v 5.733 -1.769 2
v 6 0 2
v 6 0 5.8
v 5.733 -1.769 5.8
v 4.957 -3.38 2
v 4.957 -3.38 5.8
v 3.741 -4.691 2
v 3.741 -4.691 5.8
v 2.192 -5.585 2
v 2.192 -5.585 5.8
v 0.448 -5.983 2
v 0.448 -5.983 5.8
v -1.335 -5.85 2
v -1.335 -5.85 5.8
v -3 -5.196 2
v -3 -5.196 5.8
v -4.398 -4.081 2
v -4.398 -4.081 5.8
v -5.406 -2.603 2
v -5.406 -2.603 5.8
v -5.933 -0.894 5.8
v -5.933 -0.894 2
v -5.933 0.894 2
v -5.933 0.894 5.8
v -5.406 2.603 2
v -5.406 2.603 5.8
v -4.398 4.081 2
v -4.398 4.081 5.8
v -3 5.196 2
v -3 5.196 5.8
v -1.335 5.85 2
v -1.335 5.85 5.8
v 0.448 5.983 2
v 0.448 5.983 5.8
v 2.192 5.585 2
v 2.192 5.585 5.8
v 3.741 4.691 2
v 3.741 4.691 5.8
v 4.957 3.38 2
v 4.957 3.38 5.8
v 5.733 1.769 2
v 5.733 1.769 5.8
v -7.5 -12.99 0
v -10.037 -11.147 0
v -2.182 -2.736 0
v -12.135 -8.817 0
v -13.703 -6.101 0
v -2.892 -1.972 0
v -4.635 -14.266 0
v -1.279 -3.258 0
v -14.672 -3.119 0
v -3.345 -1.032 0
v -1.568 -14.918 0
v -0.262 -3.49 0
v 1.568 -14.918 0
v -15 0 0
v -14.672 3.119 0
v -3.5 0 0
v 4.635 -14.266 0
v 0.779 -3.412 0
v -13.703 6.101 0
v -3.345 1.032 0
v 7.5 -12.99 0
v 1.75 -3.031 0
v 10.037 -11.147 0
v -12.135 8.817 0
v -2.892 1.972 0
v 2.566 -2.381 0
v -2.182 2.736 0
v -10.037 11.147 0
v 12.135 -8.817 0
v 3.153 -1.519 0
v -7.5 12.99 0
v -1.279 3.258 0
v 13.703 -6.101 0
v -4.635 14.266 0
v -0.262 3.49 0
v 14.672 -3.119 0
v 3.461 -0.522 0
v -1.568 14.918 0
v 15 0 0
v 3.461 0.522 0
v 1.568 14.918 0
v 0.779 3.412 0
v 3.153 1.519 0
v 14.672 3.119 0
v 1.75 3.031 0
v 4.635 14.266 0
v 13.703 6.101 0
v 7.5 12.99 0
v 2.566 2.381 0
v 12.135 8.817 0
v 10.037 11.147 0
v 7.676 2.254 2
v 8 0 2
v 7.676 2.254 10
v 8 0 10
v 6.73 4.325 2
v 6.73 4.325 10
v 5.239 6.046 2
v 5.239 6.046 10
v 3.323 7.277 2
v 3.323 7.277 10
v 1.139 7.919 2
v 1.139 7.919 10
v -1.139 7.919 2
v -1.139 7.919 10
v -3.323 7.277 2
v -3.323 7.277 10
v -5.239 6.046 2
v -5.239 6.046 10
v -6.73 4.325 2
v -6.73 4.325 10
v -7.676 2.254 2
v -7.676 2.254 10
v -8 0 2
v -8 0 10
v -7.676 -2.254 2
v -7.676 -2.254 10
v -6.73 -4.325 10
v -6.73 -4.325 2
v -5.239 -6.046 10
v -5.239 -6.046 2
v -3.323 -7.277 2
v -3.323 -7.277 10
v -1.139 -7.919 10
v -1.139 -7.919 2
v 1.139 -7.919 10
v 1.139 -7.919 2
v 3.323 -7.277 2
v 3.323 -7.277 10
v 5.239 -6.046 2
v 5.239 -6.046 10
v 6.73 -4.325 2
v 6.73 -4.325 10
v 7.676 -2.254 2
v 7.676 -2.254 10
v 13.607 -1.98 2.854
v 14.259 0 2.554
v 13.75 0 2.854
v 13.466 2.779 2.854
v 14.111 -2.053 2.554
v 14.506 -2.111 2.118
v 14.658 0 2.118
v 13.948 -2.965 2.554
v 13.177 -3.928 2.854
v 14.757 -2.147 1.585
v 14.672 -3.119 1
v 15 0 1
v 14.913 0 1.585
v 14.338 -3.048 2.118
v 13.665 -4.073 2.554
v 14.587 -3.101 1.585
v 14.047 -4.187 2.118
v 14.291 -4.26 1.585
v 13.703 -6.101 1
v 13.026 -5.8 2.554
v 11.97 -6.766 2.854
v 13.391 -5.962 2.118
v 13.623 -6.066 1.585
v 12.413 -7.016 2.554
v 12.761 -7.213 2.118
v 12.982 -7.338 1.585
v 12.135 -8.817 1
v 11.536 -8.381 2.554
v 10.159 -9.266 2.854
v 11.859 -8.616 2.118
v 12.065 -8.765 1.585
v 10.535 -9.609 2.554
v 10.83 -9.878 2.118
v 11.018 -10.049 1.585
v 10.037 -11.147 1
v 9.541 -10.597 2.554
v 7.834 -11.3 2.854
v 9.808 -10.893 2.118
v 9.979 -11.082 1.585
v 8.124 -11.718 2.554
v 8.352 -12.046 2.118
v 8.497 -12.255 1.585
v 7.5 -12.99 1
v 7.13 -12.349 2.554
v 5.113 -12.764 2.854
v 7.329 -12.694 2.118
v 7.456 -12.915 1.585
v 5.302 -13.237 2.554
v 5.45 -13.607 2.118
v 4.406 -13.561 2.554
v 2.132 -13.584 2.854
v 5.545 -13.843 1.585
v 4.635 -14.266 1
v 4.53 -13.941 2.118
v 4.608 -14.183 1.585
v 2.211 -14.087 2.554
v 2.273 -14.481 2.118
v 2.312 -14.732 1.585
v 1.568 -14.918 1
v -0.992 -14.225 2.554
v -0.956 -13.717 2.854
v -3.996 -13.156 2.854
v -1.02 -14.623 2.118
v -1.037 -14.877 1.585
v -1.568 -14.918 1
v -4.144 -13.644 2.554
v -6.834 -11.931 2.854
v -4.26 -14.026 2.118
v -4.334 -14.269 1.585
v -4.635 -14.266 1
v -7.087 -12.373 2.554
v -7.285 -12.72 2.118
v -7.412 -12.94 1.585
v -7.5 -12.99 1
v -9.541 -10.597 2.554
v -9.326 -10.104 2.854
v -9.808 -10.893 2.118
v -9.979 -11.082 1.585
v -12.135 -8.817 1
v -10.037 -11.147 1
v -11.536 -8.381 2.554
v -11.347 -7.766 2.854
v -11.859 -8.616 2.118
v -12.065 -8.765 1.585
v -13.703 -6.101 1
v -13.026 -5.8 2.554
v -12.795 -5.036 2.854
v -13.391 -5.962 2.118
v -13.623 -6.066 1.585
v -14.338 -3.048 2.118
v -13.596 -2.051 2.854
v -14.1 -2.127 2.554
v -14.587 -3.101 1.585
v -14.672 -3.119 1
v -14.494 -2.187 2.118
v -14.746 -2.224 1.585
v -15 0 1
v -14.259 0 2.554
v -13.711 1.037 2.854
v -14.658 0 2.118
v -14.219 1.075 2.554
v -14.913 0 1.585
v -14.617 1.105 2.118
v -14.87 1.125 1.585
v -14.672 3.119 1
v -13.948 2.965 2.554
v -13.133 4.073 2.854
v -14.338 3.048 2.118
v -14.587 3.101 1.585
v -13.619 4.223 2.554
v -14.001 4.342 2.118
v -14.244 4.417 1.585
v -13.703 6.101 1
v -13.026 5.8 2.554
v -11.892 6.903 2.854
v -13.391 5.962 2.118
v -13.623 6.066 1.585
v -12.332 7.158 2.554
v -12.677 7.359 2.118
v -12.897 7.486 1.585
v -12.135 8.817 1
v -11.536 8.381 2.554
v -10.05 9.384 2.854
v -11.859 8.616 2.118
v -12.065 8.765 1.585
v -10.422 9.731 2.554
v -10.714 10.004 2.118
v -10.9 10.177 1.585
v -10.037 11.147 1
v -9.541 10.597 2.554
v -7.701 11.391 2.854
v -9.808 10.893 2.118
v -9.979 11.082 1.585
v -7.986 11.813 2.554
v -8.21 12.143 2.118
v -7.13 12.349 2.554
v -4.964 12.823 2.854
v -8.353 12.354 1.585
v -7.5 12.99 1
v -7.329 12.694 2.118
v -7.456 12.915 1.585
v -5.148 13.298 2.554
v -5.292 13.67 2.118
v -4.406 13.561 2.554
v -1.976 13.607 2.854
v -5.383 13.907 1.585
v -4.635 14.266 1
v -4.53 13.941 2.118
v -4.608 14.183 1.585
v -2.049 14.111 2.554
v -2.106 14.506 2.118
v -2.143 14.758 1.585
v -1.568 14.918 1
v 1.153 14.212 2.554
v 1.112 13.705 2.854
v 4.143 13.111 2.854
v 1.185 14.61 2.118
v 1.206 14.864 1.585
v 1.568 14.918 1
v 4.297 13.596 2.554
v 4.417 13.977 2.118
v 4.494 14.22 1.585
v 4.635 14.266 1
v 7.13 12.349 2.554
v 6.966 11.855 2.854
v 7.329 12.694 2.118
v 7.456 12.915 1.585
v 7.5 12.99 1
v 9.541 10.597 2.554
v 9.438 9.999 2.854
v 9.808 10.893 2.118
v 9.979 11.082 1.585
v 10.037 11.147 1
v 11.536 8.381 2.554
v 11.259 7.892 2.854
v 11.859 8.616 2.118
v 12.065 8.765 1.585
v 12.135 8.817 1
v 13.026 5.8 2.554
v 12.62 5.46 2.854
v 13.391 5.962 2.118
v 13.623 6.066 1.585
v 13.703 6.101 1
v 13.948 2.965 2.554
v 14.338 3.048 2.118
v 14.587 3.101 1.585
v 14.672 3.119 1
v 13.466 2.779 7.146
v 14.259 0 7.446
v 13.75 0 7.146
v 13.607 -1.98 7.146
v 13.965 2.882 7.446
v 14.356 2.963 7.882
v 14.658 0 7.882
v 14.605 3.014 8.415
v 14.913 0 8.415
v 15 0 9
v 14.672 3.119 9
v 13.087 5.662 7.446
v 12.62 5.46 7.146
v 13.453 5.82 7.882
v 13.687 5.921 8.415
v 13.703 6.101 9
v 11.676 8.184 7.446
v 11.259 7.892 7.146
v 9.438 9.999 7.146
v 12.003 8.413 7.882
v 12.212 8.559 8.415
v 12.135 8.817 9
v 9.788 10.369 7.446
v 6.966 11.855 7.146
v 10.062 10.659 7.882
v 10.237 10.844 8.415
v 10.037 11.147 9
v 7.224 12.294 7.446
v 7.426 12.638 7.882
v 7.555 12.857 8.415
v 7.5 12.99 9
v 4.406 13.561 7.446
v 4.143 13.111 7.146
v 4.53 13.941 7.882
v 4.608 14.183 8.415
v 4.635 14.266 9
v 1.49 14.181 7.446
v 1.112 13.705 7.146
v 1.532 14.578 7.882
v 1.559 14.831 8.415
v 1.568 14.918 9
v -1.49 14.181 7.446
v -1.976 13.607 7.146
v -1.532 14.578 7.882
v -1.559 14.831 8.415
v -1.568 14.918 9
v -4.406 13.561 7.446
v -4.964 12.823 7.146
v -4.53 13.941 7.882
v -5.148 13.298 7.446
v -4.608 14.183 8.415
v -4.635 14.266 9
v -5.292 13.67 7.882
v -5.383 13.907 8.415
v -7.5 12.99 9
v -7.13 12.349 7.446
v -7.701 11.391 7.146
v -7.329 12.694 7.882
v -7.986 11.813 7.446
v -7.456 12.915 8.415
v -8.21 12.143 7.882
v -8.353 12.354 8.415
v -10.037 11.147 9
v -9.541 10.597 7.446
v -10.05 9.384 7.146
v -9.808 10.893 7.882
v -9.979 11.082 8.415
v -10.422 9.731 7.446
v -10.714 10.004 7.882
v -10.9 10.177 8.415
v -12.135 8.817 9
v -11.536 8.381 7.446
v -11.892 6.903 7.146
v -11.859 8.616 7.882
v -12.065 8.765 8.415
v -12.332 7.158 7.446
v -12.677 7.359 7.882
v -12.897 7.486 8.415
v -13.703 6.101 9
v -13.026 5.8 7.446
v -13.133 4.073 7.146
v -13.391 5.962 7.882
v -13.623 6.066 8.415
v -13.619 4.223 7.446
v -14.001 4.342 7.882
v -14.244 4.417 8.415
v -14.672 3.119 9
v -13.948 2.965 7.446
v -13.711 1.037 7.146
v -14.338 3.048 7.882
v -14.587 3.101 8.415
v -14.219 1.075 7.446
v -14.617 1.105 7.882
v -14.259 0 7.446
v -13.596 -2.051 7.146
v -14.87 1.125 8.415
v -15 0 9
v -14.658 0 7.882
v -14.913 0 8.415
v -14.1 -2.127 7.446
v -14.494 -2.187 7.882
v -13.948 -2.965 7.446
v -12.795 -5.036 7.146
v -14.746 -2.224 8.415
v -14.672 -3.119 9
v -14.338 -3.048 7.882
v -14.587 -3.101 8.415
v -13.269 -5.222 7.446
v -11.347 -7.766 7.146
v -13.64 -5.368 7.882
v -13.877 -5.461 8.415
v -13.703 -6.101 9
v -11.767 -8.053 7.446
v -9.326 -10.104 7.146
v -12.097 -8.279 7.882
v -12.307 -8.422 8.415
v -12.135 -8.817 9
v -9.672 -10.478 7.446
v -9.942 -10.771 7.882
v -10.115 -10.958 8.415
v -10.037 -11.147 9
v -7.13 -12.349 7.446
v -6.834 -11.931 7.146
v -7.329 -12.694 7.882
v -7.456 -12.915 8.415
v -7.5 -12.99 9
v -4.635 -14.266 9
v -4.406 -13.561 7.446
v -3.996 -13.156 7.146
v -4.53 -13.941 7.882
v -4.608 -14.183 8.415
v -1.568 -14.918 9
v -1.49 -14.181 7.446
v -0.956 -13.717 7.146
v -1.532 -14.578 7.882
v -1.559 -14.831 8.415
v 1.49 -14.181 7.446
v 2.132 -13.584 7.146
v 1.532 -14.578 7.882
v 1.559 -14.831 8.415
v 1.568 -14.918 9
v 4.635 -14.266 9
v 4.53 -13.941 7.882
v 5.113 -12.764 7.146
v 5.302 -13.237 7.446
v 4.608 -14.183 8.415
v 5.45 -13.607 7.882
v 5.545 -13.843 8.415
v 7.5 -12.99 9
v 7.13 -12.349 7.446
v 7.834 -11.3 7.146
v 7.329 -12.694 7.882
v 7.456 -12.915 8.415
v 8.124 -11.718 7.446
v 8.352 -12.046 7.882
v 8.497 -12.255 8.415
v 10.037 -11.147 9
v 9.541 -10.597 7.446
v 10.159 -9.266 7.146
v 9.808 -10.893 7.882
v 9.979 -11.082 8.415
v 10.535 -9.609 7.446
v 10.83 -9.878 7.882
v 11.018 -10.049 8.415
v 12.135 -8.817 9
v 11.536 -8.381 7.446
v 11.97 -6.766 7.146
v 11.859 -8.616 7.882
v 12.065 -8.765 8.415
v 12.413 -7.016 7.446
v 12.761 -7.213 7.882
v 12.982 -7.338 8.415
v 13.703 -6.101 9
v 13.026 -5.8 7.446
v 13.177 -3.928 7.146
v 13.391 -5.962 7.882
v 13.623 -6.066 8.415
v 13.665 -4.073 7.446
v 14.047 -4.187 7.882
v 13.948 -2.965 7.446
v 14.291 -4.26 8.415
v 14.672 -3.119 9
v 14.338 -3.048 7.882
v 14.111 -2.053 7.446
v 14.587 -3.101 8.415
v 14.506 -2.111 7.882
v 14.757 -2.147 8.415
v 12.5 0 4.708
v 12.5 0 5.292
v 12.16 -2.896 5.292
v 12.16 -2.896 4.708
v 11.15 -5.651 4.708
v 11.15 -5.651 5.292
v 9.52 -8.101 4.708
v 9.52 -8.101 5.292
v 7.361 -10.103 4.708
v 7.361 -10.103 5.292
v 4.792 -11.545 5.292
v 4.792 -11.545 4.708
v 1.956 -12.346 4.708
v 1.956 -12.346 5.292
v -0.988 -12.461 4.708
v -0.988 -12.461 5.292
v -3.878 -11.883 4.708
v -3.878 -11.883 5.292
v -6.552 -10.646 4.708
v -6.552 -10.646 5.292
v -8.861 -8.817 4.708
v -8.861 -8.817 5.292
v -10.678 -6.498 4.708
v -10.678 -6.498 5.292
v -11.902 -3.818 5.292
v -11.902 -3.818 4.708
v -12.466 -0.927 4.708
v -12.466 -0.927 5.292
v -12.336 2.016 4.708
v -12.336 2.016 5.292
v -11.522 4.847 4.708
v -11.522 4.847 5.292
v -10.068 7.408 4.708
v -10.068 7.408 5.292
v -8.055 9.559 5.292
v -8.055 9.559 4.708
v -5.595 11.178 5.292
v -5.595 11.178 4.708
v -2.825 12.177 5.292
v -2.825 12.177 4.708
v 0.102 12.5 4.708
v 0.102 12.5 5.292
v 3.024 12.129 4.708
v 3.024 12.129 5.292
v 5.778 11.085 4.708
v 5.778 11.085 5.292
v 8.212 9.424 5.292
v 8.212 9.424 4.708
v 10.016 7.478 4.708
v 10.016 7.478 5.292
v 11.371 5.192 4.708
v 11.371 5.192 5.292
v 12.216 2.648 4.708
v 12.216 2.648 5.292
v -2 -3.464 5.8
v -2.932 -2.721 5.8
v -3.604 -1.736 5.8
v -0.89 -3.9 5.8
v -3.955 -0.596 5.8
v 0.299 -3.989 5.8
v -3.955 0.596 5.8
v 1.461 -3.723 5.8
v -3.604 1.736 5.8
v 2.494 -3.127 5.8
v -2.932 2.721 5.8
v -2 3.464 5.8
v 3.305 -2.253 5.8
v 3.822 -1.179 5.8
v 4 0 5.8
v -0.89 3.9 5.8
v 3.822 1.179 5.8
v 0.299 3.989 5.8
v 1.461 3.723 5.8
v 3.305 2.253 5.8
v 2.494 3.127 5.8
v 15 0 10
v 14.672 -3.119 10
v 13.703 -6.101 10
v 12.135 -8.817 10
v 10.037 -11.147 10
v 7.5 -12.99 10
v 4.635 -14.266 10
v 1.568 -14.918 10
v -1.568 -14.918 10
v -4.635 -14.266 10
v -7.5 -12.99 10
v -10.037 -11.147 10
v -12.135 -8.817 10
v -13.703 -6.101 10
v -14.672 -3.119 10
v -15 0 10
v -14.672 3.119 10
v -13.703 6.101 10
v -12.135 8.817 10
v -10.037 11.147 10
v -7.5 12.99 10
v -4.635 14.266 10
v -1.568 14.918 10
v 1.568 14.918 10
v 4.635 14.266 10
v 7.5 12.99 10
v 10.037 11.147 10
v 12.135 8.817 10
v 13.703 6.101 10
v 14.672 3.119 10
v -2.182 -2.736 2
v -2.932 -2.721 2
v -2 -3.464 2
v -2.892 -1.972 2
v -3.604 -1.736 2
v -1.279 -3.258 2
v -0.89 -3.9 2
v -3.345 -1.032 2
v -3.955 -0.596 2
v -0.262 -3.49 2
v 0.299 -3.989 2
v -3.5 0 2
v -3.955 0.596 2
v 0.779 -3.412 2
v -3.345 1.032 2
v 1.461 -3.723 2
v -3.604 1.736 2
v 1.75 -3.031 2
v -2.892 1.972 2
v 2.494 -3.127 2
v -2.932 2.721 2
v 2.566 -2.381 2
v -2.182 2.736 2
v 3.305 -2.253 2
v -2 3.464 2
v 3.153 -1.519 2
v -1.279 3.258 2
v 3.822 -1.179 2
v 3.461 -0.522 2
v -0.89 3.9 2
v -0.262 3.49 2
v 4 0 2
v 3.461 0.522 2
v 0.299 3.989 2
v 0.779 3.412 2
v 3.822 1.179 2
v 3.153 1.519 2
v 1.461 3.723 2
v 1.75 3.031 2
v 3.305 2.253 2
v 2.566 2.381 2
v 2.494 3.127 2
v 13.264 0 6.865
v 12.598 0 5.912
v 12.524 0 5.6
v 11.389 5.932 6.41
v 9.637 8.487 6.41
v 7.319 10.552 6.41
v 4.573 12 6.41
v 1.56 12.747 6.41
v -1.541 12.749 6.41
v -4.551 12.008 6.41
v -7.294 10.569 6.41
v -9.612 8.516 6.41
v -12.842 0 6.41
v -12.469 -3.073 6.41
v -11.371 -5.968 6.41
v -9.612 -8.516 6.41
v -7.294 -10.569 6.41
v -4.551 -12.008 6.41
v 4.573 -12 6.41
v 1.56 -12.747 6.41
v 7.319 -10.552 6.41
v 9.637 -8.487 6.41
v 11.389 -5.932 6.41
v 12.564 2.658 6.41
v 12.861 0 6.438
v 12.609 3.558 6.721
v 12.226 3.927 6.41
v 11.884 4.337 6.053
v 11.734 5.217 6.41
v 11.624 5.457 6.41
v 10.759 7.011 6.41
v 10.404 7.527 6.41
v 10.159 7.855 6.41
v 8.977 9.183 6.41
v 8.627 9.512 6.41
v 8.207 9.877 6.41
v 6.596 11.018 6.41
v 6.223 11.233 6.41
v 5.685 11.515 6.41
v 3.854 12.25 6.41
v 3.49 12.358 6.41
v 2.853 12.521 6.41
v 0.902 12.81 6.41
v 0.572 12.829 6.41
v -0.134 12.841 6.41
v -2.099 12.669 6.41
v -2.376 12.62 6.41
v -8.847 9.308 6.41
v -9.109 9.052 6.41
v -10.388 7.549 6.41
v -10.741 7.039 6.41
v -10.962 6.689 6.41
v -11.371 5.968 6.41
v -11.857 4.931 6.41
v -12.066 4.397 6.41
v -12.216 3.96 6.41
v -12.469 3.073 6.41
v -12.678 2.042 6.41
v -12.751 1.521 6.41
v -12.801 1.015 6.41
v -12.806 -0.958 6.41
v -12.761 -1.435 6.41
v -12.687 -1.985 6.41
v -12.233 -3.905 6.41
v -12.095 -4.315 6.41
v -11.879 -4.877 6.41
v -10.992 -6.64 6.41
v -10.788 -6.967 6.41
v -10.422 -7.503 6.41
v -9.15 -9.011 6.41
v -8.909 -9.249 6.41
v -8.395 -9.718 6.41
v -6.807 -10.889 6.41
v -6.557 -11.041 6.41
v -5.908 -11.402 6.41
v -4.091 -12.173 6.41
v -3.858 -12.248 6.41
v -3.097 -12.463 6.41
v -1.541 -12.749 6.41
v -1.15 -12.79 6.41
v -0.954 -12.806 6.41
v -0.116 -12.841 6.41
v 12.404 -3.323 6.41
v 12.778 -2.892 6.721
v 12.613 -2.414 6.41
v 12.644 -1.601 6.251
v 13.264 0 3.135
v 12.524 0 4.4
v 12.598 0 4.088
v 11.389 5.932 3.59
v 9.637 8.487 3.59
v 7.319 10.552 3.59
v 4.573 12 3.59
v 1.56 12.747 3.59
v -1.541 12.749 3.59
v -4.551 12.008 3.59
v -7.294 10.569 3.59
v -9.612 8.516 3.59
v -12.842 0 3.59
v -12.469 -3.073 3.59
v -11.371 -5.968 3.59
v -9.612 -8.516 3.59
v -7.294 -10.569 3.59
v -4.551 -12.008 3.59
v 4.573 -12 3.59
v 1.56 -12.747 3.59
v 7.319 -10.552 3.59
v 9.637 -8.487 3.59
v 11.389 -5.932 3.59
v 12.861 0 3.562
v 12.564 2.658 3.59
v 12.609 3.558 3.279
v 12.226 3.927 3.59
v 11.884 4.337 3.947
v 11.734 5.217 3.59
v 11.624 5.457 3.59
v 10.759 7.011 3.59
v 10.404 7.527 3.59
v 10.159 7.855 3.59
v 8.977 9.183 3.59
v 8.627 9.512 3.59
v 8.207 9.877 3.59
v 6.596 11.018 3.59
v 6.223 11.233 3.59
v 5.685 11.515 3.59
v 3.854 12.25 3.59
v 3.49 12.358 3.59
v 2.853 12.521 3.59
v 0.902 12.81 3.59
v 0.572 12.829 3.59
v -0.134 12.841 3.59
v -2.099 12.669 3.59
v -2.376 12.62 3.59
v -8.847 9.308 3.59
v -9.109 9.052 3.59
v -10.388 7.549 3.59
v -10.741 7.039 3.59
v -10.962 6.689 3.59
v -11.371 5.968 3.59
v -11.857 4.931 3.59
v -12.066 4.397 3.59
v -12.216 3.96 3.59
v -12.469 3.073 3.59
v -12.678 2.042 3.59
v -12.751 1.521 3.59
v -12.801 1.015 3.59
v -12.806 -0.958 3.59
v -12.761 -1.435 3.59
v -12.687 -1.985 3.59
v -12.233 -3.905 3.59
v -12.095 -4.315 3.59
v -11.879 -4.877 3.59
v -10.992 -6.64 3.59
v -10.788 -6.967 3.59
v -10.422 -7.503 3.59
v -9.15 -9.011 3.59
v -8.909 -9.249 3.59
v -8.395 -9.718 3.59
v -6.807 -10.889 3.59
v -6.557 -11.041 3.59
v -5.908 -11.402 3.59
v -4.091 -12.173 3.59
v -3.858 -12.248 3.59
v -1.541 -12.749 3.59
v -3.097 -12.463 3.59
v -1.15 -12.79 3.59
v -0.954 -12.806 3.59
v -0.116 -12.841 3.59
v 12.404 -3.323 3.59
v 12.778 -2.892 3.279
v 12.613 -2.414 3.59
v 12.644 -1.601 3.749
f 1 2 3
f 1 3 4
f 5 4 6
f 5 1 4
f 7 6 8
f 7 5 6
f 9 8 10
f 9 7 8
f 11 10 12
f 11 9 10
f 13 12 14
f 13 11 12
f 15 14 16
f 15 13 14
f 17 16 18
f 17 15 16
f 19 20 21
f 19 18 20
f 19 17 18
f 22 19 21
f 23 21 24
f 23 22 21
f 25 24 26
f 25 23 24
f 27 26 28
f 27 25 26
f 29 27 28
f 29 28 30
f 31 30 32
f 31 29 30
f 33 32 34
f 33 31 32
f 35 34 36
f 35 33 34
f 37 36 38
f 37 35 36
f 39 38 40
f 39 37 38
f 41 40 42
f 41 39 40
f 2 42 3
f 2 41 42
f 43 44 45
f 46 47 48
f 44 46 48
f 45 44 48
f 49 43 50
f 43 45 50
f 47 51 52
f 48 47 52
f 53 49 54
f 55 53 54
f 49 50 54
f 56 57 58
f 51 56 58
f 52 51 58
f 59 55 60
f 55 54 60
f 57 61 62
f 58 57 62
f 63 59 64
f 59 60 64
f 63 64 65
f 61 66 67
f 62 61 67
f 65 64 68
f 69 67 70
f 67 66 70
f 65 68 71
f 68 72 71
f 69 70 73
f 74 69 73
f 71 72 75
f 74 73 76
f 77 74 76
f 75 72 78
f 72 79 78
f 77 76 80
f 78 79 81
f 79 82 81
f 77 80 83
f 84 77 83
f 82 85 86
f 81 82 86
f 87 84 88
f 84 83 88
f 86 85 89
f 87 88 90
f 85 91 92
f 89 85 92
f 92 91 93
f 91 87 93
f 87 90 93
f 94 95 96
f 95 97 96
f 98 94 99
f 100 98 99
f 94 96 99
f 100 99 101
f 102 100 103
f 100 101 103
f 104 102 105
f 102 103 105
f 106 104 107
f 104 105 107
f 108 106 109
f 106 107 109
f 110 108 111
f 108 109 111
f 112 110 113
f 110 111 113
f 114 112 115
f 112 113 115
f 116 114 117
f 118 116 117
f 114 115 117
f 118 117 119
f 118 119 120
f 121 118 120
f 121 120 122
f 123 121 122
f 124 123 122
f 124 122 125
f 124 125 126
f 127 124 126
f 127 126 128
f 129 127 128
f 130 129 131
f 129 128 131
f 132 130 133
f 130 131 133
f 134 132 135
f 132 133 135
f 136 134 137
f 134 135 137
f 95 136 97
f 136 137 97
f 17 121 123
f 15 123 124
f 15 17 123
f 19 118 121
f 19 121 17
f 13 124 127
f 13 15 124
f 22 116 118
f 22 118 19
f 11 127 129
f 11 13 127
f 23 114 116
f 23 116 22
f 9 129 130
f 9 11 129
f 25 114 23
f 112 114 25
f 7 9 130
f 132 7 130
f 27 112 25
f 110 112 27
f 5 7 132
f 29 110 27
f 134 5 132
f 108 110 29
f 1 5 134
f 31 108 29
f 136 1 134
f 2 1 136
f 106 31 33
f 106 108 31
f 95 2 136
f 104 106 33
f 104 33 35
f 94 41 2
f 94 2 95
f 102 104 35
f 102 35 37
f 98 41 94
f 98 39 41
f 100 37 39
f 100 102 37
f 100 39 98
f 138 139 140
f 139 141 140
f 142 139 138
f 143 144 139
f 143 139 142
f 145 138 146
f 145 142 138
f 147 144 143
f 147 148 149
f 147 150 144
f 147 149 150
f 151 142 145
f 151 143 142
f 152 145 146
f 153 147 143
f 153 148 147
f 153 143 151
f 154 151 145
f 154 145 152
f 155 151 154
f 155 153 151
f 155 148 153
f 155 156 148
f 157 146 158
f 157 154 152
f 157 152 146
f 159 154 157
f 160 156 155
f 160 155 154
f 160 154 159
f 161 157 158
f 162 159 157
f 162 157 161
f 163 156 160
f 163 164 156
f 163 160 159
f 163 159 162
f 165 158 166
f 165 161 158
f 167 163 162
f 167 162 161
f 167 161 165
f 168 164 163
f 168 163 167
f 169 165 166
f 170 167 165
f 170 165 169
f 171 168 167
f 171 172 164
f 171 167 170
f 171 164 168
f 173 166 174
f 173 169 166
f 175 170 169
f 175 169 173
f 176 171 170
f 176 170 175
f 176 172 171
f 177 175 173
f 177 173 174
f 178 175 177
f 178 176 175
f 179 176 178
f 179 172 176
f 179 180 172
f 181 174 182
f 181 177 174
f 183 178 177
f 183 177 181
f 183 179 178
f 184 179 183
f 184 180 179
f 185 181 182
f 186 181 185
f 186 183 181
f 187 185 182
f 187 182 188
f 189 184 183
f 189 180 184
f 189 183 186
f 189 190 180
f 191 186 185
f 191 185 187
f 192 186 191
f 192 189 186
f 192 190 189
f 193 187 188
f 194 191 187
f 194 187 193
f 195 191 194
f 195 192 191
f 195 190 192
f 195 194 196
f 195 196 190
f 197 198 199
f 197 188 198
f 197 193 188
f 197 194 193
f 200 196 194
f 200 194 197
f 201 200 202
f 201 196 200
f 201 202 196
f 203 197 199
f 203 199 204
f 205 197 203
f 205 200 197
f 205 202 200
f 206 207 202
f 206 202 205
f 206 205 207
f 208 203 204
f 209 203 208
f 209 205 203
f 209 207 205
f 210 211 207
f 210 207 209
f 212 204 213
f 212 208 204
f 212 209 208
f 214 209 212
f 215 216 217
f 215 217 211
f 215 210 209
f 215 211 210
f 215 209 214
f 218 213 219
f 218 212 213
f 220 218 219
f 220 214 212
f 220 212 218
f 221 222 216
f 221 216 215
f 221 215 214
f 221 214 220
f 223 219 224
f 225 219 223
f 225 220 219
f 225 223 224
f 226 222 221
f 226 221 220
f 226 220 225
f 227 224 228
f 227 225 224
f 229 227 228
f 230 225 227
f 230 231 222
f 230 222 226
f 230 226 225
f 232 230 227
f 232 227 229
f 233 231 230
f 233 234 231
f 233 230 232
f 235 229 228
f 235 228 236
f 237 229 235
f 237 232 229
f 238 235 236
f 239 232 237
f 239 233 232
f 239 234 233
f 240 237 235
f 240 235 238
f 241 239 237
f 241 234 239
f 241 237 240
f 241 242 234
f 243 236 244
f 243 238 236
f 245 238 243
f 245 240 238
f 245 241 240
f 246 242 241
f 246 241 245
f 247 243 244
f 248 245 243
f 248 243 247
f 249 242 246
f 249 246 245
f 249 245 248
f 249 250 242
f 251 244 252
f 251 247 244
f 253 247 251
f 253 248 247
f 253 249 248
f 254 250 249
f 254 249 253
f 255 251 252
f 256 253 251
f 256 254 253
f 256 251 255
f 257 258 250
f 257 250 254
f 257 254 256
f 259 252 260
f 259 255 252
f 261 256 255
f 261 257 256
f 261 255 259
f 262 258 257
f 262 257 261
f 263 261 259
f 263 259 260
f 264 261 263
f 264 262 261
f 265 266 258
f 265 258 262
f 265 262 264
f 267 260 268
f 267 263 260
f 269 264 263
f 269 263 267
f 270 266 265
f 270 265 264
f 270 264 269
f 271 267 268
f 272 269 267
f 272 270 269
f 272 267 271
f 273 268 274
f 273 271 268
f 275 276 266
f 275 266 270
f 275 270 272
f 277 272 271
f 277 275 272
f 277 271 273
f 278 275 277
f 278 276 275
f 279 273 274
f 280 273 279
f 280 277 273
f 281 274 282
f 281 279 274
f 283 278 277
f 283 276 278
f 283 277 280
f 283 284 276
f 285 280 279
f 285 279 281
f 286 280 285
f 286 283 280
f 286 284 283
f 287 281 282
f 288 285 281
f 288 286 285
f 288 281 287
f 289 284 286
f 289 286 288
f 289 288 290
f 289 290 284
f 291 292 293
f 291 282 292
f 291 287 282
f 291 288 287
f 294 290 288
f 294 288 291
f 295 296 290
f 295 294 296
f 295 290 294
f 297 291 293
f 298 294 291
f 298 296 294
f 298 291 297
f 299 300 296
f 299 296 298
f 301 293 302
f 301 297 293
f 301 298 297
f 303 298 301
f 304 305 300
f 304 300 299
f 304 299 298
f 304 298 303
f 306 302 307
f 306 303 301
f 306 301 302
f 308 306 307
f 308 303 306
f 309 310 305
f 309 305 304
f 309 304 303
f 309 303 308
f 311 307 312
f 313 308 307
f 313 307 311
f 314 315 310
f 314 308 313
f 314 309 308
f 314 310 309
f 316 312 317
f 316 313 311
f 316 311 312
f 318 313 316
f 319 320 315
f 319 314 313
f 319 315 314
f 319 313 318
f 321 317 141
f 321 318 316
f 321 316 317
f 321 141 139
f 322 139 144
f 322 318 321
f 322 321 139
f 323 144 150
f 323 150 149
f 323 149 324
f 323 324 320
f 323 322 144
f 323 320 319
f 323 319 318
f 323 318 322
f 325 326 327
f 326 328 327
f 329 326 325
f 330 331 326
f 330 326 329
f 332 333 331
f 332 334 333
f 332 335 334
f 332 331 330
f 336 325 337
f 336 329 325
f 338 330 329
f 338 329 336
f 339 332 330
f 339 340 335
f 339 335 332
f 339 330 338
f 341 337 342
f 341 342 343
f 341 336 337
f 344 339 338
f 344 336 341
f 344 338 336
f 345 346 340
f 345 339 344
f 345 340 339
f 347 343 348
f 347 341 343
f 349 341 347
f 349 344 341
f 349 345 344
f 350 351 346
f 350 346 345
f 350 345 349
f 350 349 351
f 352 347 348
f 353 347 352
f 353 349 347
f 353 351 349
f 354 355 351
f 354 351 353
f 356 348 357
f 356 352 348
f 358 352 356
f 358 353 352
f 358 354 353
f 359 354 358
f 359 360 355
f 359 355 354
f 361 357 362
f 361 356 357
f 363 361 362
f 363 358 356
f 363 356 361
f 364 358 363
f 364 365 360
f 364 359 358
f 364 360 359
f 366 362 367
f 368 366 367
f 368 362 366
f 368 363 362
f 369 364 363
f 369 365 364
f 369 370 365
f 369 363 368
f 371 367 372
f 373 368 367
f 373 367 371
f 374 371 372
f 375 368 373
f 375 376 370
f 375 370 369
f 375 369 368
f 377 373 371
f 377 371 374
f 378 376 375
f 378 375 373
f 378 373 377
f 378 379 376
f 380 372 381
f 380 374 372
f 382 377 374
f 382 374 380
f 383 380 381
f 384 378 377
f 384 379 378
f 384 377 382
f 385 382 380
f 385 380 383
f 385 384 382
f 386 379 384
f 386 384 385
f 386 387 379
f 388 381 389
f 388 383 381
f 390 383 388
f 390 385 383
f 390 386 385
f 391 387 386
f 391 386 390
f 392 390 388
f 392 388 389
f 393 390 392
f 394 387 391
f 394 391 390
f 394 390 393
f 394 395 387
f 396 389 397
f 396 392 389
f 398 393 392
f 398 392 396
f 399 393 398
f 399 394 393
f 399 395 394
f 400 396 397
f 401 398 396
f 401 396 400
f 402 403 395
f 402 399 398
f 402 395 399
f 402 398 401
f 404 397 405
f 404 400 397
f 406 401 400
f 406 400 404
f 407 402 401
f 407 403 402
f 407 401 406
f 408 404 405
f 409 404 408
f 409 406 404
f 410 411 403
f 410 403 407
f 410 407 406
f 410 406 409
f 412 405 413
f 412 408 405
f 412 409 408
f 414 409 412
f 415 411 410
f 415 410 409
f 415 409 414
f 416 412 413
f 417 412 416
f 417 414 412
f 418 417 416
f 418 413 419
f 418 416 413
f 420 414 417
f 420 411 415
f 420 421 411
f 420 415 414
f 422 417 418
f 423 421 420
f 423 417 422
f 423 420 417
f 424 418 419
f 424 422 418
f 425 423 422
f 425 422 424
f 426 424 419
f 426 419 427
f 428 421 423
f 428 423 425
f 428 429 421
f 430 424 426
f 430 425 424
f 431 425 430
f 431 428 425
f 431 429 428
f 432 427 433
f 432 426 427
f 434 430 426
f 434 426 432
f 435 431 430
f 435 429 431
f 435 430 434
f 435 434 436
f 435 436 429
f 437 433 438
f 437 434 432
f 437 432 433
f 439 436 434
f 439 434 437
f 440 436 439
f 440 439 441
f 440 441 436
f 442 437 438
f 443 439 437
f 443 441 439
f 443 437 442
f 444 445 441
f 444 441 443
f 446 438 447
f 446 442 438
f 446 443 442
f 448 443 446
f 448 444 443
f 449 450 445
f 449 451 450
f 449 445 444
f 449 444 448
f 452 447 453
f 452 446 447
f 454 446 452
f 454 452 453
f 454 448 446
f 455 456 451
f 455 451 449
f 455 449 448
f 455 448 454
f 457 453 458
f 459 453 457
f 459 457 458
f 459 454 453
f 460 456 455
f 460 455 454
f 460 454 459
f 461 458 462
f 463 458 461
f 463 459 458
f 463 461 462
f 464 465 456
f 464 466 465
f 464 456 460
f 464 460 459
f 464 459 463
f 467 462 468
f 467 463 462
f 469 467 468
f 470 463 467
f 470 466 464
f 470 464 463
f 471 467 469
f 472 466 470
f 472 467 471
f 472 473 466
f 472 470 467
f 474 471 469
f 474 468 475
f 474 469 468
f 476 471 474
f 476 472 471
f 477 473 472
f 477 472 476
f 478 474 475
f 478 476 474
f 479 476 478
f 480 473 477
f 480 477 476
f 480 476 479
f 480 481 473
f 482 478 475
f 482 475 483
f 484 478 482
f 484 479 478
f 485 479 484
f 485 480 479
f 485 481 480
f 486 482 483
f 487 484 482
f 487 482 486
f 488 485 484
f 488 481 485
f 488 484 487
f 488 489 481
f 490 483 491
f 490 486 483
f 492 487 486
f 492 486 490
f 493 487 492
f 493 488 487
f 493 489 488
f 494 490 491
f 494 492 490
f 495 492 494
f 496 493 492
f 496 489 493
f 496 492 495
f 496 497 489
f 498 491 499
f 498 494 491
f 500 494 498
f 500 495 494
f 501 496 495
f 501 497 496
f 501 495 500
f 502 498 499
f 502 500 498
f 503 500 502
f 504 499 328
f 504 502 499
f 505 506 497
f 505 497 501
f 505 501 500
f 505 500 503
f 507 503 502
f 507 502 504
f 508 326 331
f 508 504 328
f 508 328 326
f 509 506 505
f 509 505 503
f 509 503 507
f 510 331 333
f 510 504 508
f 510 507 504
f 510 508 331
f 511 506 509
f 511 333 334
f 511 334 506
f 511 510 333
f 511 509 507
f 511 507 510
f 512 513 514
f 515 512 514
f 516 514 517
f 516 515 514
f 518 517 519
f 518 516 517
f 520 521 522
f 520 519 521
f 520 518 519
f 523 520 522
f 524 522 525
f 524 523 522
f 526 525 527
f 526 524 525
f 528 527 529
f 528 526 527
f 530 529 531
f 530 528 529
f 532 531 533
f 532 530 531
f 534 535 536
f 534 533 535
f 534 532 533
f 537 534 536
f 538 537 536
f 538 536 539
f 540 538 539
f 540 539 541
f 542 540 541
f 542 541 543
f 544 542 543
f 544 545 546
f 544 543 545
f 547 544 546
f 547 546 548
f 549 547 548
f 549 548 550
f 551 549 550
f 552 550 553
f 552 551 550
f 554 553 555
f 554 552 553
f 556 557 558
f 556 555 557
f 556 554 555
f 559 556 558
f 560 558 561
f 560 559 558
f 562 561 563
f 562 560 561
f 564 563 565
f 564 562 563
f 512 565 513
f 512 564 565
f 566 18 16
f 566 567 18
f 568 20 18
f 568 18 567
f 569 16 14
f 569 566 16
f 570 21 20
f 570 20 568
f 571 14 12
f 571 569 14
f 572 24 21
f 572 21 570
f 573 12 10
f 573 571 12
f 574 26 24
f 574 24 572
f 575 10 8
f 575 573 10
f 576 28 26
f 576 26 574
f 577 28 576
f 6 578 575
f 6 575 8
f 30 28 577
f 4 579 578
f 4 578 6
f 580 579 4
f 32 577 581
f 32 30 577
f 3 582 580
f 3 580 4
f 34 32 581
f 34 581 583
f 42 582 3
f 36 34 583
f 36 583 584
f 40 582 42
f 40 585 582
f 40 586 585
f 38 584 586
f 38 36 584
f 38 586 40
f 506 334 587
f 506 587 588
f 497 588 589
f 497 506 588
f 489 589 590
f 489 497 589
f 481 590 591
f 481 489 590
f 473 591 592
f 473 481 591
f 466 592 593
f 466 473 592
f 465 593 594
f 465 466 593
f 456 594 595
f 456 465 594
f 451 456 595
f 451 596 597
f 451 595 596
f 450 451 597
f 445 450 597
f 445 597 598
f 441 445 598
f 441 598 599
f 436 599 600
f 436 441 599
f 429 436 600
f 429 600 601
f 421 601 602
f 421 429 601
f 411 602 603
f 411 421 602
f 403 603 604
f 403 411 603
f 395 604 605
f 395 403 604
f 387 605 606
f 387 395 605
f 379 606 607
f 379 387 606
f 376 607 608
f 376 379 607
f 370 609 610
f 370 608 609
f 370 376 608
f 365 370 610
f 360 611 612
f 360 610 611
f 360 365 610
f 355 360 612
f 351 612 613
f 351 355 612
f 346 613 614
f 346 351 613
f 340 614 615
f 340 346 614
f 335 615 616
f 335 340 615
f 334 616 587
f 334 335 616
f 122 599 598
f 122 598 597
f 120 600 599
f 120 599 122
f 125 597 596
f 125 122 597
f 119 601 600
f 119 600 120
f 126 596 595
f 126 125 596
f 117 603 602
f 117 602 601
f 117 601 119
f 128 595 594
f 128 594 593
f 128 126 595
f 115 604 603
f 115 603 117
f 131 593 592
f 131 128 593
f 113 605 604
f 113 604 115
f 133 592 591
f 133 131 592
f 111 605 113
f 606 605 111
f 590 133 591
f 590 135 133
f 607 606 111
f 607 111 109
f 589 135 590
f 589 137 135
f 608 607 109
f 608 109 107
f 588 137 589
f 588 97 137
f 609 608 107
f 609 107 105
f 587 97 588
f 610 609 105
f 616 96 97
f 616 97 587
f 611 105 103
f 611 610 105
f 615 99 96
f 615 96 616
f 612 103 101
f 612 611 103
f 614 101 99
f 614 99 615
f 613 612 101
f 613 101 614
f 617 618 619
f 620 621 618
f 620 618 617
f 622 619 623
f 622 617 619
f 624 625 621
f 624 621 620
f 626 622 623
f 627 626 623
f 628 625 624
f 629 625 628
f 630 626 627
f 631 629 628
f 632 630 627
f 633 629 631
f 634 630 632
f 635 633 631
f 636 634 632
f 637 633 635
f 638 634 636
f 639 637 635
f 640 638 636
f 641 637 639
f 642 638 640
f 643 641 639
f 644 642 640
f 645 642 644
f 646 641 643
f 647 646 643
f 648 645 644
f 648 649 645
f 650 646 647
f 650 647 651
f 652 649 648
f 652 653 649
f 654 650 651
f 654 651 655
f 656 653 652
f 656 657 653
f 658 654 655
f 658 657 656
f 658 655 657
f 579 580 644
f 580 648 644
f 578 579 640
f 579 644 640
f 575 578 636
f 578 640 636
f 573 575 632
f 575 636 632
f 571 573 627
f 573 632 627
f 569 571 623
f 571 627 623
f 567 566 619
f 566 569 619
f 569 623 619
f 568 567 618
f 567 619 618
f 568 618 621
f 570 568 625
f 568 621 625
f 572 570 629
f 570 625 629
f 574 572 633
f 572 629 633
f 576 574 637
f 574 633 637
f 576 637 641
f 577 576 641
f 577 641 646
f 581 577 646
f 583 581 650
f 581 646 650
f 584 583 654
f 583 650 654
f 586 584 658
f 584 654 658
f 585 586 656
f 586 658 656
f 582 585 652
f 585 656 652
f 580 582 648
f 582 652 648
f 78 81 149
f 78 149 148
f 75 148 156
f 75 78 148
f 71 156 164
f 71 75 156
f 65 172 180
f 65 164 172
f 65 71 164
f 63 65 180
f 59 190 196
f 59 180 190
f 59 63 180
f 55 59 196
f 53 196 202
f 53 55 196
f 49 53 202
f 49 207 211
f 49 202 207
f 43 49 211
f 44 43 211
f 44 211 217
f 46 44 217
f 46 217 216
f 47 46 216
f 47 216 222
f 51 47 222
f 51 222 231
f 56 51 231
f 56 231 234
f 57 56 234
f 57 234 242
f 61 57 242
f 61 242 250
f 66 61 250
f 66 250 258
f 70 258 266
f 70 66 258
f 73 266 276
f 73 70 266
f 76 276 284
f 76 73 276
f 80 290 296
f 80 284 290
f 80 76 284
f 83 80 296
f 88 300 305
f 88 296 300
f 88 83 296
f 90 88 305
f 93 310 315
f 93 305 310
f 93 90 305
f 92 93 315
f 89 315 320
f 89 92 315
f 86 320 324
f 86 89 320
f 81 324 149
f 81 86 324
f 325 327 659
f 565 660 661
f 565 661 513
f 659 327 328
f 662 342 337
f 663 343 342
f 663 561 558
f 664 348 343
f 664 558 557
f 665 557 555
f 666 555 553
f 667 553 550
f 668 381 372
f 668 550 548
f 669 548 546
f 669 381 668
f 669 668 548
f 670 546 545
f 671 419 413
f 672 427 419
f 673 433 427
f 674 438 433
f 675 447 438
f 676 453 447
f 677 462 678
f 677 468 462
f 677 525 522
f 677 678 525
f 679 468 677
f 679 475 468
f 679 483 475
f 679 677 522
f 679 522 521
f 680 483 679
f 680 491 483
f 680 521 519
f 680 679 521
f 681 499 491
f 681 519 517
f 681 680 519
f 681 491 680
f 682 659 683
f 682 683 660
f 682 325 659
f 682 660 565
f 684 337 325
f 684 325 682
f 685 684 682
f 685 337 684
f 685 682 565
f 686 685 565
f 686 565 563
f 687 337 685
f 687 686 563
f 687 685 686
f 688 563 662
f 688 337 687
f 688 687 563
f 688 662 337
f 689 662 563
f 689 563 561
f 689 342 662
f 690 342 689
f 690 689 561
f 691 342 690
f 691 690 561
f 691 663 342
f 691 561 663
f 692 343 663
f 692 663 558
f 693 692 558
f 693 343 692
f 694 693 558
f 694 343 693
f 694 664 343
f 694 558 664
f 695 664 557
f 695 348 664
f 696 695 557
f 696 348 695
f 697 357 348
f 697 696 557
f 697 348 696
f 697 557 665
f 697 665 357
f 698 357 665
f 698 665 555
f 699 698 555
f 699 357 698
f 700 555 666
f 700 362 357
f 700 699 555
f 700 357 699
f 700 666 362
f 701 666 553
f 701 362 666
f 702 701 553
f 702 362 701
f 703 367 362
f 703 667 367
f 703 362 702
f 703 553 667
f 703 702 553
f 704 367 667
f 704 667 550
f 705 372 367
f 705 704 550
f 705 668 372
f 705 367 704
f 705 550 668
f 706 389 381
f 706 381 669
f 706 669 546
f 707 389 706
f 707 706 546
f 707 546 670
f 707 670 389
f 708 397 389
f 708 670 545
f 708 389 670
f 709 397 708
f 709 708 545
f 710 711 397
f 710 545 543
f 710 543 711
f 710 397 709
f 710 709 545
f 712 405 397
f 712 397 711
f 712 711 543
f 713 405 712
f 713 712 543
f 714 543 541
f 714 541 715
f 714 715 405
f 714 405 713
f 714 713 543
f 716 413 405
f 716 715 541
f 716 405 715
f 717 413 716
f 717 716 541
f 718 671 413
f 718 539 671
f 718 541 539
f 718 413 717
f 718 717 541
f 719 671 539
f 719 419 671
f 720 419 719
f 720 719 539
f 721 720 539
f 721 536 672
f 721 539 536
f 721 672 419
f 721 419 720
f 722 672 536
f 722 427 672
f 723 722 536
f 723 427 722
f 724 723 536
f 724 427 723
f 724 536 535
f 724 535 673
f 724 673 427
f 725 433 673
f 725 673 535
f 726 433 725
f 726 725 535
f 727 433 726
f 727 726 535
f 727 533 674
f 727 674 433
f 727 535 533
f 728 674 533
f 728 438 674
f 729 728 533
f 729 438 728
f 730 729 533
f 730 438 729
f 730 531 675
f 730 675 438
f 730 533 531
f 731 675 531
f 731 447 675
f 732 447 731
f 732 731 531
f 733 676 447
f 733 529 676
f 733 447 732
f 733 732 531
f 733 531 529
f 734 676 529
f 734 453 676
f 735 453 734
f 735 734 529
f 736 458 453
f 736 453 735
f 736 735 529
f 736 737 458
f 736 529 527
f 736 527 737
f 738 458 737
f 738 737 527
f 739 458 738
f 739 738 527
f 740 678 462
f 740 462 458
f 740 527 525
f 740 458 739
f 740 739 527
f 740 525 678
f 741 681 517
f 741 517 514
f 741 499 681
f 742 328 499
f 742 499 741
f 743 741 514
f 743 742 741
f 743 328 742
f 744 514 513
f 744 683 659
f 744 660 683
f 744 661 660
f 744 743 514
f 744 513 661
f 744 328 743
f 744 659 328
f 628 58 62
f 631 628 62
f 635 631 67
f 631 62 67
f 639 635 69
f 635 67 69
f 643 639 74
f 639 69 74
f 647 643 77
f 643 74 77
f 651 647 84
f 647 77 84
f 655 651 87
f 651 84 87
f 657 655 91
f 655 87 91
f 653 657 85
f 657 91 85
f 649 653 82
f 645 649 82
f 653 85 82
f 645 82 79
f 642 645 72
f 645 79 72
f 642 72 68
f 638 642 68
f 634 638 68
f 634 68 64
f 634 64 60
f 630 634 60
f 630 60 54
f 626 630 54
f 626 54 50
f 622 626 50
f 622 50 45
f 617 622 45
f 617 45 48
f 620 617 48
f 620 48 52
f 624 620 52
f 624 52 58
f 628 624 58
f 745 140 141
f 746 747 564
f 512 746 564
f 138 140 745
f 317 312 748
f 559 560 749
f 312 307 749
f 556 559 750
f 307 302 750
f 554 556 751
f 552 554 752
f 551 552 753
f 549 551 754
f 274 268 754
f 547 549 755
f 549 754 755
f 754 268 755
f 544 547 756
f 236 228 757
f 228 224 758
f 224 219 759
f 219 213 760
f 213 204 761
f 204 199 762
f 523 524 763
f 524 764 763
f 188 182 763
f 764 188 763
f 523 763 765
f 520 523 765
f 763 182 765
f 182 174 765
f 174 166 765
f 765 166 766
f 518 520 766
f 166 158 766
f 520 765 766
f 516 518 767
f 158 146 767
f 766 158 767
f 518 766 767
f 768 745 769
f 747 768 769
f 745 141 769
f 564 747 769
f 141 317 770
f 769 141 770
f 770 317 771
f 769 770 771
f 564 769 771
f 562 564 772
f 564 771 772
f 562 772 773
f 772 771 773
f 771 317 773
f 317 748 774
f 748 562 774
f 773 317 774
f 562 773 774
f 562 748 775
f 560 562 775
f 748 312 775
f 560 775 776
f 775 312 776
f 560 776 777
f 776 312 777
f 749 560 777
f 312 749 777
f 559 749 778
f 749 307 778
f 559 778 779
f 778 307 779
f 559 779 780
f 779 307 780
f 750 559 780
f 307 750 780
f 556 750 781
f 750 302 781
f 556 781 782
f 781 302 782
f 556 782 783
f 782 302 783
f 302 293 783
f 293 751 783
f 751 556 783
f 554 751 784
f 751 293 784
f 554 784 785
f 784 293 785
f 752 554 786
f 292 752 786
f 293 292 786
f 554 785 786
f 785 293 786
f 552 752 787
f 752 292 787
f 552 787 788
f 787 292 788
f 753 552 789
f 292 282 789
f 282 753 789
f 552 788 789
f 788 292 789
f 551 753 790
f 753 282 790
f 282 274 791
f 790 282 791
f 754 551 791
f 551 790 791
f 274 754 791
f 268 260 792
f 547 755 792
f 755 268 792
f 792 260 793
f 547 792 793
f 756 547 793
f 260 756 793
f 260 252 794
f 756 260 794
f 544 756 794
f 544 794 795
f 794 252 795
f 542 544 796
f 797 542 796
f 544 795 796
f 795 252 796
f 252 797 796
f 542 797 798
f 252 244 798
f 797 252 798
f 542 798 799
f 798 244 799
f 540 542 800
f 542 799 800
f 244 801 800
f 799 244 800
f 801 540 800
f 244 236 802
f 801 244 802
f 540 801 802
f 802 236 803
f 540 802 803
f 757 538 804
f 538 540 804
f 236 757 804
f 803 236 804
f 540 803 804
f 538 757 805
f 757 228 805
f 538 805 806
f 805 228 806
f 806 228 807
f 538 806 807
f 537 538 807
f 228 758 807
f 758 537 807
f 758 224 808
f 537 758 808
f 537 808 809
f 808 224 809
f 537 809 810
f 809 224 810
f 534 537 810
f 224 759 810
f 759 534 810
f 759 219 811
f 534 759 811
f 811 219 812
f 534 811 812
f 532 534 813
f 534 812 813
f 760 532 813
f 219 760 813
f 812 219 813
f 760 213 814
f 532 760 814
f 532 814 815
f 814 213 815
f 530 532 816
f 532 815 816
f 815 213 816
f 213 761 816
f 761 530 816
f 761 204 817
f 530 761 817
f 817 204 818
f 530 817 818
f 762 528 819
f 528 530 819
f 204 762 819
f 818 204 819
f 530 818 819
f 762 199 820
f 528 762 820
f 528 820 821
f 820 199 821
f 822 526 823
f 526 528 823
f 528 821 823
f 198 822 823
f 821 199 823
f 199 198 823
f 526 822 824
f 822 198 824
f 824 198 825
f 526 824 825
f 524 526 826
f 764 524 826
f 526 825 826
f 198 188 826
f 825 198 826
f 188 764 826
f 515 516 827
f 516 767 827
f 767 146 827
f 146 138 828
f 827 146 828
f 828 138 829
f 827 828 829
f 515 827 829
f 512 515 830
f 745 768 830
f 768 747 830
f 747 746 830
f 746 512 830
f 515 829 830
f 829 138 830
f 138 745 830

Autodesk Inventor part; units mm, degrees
ref_plane "YZ Plane" through (0, 0, 0) normal (1, 0, 0) x (0, 1, 0)
ref_plane "XZ Plane" through (0, 0, 0) normal (0, 1, 0) x (-1, 0, 0)
ref_plane "XY Plane" through (0, 0, 0) normal (0, 0, 1) x (1, 0, 0)
sketch "Sketch1" plane through (0, 0, 0) normal (0, 0, 1) x (1, 0, 0)
  circle A0 centre (0, 0) radius 15
  dimension "d0" = 30
extrude "Extrusion1" add sketch "Sketch1" along normal blind 3
sketch "Sketch2" plane through (0, 0, 3) normal (0, 0, 1) x (1, 0, 0)
  circle A0 centre (0, 0) radius 15 projected
  circle A1 centre (0, 0) radius 12.5
  dimension "d4" = 25
extrude "Extrusion2" add sketch "Sketch2" along normal blind 4 contours A1
sketch "Sketch3" plane through (0, 0, 7) normal (0, 0, 1) x (1, 0, 0)
  circle A0 centre (0, 0) radius 12.5 projected
  circle A1 centre (0, 0) radius 15
extrude "Extrusion3" add sketch "Sketch3" along normal blind 3 contours A0 | A1
fillet "Fillet1" radius 2 4 edges at (-15, 0, 3) (-12.5, 0, 3) (-15, 0, 7) (-12.5, 0, 7)
sketch "Sketch5" plane through (0, 0, 0) normal (0, 0, -1) x (-1, 0, 0)
  circle A0 centre (0, 0) radius 15 projected
  circle A1 centre (0, 0) radius 3.5
  dimension "d15" = 7
extrude "Extrusion5" cut sketch "Sketch5" against normal blind 4 contours A1
sketch "Sketch6" plane through (0, 0, 4) normal (0, 0, -1) x (-1, 0, 0)
  circle A0 centre (0, 0) radius 3.5 projected
  circle A1 centre (0, 0) radius 3.6
  dimension "d19" = 7.2
extrude "Extrusion6" cut sketch "Sketch6" against normal blind 4 contours A0 | A1
sketch "Sketch7" plane through (0, 0, 10) normal (0, 0, 1) x (1, 0, 0)
  circle A0 centre (0, 0) radius 15 projected
  circle A1 centre (0, 0) radius 8
  dimension "d24" = 16
extrude "Extrusion7" cut sketch "Sketch7" against normal blind 8 contours A1
sketch "Sketch8" plane through (0, 0, 2) normal (0, 0, 1) x (1, 0, 0)
  circle A0 centre (0, 0) radius 8 projected
  circle A1 centre (0, 0) radius 6
  circle A2 centre (0, 0) radius 4
  dimension "d28" = 12
  dimension "d30" = 8
extrude "Extrusion8" add sketch "Sketch8" along normal blind 3.8 contours A1
properties part number "Wire guidance wheelV2"
